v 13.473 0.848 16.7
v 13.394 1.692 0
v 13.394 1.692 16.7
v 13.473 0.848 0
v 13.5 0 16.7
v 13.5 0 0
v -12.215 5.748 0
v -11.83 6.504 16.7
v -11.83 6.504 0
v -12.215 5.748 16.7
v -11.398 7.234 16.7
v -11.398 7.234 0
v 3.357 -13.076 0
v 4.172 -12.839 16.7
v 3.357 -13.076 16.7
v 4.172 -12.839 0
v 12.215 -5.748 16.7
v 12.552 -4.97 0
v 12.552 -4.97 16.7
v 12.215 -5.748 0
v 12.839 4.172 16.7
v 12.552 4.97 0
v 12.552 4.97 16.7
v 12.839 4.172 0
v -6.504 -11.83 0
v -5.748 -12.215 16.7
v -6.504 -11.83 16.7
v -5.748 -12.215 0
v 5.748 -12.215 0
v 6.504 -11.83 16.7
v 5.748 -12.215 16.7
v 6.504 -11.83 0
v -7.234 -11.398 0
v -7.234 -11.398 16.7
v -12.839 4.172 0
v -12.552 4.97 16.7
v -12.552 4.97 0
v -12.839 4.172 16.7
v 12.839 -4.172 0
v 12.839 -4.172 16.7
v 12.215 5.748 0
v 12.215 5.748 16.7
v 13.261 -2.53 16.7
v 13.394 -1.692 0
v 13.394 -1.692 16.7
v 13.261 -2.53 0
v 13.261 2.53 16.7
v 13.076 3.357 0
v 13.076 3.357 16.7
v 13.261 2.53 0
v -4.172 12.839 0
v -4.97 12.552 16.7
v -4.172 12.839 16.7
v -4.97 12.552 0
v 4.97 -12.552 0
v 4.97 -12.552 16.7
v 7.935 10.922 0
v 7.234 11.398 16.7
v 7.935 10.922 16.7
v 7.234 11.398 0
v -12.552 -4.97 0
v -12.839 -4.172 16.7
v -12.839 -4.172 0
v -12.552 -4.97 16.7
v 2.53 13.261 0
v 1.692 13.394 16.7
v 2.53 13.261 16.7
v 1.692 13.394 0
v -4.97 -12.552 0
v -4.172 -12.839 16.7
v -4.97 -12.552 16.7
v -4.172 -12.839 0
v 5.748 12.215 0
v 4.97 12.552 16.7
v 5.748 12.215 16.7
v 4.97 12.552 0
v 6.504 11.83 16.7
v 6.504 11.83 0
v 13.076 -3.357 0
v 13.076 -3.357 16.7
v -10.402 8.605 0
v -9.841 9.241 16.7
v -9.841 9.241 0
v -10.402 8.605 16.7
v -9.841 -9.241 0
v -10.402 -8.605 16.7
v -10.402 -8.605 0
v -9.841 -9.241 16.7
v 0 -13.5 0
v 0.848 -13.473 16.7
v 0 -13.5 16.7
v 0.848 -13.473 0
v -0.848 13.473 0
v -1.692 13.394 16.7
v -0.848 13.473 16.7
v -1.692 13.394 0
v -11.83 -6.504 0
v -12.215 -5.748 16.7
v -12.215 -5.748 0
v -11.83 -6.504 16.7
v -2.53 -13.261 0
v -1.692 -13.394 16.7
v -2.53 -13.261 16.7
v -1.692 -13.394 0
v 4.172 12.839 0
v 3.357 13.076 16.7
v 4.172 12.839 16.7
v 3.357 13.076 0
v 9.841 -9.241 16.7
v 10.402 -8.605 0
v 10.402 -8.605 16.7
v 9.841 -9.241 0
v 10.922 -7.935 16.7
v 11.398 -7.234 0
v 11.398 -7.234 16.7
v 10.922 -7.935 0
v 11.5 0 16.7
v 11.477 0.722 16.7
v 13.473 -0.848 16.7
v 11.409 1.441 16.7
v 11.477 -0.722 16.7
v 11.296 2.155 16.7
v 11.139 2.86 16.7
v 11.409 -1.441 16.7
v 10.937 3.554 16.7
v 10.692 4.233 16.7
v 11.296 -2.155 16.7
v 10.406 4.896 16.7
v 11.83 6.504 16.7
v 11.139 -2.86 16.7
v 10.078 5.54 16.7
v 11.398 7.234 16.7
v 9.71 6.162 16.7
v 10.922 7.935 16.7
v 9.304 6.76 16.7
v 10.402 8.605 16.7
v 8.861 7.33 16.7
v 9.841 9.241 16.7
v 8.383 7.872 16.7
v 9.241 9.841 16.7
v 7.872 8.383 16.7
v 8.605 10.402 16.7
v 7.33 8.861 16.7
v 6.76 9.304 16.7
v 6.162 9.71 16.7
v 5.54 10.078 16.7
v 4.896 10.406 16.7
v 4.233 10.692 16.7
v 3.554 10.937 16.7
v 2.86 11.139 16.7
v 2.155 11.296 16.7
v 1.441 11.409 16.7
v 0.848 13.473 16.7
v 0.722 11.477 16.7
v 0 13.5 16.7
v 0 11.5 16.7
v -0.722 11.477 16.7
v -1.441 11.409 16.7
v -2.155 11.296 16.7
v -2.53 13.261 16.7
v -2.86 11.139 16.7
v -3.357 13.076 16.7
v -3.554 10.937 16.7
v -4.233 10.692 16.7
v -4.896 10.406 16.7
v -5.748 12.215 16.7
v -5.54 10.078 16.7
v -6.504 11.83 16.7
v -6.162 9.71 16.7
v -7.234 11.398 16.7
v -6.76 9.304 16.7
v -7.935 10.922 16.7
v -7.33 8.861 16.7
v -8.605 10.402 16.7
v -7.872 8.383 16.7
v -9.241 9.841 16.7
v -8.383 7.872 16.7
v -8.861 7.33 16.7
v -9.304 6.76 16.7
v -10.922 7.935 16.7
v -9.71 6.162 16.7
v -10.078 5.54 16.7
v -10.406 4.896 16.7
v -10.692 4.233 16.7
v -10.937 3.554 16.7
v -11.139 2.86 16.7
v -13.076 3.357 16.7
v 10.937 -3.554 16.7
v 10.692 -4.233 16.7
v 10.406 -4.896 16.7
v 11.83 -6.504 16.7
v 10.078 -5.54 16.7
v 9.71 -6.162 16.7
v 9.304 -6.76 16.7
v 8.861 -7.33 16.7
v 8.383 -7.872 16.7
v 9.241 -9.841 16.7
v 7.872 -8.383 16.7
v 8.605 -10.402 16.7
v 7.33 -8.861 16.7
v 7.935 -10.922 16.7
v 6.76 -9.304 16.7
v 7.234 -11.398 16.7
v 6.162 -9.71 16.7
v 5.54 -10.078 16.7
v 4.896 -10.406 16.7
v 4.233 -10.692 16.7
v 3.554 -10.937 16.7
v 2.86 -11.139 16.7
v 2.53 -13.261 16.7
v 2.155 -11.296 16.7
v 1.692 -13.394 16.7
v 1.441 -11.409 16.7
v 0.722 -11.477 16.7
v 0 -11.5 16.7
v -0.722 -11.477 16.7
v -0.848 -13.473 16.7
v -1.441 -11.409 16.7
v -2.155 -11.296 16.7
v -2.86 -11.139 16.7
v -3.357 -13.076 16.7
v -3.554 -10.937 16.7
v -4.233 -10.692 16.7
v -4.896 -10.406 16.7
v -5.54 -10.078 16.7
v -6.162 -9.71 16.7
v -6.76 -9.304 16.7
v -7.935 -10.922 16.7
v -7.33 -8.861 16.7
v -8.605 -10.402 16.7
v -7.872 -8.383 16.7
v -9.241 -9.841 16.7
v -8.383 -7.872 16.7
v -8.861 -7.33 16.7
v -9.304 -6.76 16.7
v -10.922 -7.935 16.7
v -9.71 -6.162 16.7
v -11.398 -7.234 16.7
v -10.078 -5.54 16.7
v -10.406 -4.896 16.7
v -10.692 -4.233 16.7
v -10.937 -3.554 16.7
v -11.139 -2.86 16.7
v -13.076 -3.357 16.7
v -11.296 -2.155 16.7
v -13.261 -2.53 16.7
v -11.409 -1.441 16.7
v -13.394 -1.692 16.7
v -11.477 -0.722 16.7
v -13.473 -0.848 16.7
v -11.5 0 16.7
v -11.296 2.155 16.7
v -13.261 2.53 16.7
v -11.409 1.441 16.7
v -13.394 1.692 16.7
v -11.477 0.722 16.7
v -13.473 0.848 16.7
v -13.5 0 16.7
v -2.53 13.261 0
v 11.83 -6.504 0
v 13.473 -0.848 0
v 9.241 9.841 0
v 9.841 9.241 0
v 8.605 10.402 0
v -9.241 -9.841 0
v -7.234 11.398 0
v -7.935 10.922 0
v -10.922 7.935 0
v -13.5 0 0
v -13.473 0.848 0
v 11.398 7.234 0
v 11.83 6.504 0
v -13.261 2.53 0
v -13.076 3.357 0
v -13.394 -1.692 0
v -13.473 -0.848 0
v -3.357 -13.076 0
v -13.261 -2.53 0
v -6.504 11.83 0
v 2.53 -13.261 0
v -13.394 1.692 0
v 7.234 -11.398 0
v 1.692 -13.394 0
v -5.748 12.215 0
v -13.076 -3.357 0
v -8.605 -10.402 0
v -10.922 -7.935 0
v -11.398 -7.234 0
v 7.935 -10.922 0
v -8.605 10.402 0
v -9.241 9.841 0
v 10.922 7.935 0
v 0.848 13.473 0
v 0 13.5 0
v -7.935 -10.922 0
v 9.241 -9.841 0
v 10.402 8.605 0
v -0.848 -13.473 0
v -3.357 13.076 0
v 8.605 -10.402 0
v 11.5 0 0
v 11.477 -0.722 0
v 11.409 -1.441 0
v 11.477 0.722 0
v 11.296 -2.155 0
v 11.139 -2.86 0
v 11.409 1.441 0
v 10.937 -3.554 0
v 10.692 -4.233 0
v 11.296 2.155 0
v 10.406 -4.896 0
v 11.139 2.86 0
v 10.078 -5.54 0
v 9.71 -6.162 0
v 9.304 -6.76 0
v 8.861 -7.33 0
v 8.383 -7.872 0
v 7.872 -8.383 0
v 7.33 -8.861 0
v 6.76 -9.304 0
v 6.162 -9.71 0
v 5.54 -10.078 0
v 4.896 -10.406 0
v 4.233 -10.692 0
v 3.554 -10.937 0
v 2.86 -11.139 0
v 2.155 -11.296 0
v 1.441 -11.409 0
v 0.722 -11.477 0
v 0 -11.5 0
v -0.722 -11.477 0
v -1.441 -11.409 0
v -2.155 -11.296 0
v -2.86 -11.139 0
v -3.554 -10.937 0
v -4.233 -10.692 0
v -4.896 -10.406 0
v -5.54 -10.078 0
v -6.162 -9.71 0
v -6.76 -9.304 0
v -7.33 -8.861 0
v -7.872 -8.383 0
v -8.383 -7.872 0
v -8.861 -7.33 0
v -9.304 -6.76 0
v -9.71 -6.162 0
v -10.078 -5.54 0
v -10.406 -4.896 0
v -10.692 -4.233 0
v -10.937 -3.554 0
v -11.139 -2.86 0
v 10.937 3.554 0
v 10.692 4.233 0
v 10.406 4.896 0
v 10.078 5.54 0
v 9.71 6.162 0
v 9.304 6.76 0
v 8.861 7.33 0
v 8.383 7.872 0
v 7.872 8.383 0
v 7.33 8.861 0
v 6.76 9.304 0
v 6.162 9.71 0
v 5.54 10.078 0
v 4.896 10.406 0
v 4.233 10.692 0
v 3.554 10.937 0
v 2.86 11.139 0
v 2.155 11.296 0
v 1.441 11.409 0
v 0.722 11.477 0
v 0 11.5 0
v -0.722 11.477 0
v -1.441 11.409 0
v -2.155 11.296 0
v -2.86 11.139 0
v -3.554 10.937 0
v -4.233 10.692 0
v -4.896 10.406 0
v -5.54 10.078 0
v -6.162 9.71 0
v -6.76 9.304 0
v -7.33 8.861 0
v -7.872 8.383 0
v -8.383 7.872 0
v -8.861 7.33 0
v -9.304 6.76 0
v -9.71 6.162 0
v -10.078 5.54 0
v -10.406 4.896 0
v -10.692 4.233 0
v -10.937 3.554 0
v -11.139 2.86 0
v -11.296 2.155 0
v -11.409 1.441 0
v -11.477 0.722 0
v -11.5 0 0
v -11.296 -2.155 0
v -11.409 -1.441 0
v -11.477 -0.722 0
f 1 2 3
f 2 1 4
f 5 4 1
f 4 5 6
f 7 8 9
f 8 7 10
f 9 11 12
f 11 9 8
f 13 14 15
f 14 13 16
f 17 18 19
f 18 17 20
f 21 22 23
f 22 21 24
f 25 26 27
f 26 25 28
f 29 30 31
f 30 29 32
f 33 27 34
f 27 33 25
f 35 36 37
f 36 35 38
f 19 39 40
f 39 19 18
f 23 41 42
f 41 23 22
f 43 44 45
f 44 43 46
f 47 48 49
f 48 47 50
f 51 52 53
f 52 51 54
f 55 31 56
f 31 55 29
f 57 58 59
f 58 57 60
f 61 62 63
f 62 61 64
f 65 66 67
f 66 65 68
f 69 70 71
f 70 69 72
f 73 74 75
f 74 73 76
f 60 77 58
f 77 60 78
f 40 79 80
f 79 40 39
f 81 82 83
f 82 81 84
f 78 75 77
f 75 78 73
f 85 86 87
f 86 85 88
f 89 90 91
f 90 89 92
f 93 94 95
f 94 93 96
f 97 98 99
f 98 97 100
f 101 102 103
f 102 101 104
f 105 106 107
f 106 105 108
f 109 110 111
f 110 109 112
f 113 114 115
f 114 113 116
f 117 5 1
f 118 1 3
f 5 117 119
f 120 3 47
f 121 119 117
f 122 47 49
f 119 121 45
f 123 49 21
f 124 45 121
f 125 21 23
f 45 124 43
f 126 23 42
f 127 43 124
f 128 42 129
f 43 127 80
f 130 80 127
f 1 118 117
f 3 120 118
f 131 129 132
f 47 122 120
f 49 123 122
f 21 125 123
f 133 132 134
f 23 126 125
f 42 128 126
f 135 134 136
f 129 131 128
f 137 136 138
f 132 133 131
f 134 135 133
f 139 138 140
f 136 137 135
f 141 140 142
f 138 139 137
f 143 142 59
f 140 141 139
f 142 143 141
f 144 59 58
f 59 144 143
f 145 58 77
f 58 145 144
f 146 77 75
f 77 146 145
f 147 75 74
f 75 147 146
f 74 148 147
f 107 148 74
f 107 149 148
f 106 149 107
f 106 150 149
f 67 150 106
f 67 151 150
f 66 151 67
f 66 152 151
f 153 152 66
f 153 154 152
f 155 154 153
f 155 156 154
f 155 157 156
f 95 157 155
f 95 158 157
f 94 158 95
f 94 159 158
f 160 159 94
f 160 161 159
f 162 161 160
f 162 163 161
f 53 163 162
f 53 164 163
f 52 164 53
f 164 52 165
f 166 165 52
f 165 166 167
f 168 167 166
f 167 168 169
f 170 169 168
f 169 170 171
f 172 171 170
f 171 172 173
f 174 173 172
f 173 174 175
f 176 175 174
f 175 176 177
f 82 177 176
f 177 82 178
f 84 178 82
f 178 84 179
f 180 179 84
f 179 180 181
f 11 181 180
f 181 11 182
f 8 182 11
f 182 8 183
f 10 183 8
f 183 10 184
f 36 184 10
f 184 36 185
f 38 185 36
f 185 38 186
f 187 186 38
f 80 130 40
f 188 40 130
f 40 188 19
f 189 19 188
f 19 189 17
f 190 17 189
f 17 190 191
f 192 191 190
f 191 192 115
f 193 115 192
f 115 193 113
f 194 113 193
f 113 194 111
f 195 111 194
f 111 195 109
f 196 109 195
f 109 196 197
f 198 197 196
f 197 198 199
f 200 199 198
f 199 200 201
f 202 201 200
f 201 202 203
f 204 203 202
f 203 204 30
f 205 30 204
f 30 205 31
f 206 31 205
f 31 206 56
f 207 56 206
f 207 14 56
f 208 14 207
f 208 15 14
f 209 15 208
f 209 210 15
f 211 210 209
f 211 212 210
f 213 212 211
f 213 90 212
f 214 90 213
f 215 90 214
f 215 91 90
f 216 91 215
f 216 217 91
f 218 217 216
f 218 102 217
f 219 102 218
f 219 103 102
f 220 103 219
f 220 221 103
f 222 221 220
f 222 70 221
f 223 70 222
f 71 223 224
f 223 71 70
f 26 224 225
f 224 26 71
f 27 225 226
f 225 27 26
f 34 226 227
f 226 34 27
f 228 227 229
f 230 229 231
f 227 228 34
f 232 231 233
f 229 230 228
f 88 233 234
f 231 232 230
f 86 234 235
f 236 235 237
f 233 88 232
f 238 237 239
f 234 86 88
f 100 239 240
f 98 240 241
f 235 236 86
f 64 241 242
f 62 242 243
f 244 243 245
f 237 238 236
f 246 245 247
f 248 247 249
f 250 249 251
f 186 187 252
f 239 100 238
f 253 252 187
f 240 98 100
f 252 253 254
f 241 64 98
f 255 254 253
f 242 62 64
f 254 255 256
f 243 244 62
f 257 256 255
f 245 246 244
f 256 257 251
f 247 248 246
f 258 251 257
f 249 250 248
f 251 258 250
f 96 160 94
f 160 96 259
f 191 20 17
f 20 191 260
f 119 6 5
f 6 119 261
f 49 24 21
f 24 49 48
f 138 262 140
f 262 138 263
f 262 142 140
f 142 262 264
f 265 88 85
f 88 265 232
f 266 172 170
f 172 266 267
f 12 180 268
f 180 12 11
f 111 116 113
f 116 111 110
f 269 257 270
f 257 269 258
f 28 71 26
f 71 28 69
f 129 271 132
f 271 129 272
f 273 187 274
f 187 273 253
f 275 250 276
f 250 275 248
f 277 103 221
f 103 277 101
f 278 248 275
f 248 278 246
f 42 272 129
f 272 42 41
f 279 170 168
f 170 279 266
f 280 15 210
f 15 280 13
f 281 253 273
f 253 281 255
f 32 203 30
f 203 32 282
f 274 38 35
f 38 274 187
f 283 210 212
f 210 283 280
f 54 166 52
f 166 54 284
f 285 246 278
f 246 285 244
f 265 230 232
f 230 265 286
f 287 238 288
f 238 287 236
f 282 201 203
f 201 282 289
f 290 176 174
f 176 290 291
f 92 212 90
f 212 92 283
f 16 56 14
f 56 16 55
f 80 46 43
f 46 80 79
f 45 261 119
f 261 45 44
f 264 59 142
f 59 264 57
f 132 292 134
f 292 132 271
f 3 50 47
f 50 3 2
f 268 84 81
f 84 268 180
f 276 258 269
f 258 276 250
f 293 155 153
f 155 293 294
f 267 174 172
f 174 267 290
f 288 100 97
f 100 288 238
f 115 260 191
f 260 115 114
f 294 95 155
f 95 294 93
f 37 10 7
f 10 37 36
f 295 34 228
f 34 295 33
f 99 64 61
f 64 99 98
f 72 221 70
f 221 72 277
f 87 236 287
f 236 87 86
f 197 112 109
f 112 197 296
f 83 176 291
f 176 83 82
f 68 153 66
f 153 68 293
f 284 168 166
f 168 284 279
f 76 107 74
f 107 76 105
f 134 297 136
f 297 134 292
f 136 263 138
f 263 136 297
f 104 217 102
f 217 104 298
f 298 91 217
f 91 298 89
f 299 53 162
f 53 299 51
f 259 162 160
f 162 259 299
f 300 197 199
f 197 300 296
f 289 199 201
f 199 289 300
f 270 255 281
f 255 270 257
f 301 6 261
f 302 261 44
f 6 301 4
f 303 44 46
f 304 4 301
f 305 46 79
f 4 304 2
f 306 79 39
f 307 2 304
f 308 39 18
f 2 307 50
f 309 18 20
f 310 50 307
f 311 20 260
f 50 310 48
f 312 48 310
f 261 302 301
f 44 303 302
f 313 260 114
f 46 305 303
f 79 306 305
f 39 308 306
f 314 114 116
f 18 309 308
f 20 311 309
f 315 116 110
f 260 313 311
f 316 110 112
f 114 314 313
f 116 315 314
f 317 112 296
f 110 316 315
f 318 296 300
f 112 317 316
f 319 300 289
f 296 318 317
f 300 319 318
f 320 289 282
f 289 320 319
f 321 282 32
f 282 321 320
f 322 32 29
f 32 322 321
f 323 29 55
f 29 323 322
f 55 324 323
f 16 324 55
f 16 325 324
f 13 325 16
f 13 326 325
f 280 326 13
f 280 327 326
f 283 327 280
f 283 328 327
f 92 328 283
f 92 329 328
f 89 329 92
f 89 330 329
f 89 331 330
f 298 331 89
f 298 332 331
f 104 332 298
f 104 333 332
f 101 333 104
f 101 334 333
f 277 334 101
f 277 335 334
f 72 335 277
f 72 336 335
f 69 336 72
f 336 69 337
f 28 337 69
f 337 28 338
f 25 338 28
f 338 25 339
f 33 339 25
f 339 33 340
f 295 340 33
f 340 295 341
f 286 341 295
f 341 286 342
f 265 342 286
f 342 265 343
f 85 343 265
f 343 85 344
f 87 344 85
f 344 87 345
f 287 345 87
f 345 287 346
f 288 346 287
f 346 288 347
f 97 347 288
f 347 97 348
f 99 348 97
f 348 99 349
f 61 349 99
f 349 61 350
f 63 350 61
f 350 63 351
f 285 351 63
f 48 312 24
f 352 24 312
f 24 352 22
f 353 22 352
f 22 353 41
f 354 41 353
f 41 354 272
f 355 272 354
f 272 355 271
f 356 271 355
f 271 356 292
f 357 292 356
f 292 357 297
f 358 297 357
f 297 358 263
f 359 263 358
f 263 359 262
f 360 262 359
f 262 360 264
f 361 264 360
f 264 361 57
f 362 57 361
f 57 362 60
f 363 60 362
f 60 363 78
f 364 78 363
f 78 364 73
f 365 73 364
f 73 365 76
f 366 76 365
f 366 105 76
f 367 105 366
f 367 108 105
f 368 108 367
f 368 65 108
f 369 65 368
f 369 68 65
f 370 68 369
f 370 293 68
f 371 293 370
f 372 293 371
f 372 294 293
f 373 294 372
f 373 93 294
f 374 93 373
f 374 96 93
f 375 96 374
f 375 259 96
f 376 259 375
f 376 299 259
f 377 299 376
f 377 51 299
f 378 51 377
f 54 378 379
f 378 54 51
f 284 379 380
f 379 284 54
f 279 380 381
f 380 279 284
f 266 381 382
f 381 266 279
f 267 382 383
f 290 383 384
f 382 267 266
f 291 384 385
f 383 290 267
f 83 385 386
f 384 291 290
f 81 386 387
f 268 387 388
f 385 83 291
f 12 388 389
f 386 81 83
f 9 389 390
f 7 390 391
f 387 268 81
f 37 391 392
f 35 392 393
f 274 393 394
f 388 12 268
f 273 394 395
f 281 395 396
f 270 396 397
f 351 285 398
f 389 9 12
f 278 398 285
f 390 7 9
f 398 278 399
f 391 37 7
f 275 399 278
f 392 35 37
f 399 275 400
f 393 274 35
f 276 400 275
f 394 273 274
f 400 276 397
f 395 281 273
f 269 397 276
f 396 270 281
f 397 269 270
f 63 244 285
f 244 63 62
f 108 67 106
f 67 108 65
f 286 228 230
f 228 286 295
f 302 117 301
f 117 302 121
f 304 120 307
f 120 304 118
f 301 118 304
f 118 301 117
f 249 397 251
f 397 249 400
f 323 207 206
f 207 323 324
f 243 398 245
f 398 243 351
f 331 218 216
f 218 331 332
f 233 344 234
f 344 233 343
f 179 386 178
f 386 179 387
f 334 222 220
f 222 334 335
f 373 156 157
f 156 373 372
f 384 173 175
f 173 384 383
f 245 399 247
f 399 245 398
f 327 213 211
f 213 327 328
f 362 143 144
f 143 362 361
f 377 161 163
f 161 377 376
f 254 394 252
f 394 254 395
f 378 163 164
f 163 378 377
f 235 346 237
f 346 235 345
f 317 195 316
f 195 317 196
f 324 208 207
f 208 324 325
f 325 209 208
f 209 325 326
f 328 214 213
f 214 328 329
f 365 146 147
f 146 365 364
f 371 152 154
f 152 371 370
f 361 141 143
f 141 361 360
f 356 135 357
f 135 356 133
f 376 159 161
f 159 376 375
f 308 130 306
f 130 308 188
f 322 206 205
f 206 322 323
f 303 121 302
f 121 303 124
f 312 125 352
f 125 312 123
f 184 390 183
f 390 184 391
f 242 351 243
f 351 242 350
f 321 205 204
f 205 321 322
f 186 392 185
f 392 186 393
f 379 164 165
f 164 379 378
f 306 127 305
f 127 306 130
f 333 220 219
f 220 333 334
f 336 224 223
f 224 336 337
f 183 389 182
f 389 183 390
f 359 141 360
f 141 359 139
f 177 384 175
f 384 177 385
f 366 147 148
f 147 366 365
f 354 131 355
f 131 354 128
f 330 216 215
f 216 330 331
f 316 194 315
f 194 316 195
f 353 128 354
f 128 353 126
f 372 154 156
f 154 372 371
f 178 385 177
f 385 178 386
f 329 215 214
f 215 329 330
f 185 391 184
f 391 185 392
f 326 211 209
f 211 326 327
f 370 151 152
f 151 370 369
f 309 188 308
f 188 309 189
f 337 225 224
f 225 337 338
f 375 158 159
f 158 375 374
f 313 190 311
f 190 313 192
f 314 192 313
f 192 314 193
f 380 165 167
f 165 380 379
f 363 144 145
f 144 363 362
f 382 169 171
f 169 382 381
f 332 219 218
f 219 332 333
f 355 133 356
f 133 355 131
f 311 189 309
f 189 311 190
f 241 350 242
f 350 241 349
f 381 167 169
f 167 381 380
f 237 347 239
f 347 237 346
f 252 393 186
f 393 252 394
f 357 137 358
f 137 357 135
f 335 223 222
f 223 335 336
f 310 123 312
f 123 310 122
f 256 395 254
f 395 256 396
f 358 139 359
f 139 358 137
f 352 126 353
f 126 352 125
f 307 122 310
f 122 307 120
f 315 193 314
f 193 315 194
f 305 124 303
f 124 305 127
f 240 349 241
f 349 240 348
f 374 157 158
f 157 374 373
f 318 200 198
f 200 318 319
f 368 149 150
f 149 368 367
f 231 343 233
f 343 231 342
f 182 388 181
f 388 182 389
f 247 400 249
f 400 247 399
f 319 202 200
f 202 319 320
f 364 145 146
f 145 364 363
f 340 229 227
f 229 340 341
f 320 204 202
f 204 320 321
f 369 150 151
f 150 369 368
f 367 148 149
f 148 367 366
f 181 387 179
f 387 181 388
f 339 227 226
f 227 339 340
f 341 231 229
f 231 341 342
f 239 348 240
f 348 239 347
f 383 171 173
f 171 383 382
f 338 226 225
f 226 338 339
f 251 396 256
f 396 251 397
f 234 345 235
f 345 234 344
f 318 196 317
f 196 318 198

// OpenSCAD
difference() {
    color("green"){cylinder(16.7, 13.5, 13.5, $fn= 100 );}
    translate([0,0,-0.5]){cylinder(21, 11.5, 11.5, $fn= 100 );}
    //translate([0, 20, 11]){cube([40,40,24], center = true);}
}
